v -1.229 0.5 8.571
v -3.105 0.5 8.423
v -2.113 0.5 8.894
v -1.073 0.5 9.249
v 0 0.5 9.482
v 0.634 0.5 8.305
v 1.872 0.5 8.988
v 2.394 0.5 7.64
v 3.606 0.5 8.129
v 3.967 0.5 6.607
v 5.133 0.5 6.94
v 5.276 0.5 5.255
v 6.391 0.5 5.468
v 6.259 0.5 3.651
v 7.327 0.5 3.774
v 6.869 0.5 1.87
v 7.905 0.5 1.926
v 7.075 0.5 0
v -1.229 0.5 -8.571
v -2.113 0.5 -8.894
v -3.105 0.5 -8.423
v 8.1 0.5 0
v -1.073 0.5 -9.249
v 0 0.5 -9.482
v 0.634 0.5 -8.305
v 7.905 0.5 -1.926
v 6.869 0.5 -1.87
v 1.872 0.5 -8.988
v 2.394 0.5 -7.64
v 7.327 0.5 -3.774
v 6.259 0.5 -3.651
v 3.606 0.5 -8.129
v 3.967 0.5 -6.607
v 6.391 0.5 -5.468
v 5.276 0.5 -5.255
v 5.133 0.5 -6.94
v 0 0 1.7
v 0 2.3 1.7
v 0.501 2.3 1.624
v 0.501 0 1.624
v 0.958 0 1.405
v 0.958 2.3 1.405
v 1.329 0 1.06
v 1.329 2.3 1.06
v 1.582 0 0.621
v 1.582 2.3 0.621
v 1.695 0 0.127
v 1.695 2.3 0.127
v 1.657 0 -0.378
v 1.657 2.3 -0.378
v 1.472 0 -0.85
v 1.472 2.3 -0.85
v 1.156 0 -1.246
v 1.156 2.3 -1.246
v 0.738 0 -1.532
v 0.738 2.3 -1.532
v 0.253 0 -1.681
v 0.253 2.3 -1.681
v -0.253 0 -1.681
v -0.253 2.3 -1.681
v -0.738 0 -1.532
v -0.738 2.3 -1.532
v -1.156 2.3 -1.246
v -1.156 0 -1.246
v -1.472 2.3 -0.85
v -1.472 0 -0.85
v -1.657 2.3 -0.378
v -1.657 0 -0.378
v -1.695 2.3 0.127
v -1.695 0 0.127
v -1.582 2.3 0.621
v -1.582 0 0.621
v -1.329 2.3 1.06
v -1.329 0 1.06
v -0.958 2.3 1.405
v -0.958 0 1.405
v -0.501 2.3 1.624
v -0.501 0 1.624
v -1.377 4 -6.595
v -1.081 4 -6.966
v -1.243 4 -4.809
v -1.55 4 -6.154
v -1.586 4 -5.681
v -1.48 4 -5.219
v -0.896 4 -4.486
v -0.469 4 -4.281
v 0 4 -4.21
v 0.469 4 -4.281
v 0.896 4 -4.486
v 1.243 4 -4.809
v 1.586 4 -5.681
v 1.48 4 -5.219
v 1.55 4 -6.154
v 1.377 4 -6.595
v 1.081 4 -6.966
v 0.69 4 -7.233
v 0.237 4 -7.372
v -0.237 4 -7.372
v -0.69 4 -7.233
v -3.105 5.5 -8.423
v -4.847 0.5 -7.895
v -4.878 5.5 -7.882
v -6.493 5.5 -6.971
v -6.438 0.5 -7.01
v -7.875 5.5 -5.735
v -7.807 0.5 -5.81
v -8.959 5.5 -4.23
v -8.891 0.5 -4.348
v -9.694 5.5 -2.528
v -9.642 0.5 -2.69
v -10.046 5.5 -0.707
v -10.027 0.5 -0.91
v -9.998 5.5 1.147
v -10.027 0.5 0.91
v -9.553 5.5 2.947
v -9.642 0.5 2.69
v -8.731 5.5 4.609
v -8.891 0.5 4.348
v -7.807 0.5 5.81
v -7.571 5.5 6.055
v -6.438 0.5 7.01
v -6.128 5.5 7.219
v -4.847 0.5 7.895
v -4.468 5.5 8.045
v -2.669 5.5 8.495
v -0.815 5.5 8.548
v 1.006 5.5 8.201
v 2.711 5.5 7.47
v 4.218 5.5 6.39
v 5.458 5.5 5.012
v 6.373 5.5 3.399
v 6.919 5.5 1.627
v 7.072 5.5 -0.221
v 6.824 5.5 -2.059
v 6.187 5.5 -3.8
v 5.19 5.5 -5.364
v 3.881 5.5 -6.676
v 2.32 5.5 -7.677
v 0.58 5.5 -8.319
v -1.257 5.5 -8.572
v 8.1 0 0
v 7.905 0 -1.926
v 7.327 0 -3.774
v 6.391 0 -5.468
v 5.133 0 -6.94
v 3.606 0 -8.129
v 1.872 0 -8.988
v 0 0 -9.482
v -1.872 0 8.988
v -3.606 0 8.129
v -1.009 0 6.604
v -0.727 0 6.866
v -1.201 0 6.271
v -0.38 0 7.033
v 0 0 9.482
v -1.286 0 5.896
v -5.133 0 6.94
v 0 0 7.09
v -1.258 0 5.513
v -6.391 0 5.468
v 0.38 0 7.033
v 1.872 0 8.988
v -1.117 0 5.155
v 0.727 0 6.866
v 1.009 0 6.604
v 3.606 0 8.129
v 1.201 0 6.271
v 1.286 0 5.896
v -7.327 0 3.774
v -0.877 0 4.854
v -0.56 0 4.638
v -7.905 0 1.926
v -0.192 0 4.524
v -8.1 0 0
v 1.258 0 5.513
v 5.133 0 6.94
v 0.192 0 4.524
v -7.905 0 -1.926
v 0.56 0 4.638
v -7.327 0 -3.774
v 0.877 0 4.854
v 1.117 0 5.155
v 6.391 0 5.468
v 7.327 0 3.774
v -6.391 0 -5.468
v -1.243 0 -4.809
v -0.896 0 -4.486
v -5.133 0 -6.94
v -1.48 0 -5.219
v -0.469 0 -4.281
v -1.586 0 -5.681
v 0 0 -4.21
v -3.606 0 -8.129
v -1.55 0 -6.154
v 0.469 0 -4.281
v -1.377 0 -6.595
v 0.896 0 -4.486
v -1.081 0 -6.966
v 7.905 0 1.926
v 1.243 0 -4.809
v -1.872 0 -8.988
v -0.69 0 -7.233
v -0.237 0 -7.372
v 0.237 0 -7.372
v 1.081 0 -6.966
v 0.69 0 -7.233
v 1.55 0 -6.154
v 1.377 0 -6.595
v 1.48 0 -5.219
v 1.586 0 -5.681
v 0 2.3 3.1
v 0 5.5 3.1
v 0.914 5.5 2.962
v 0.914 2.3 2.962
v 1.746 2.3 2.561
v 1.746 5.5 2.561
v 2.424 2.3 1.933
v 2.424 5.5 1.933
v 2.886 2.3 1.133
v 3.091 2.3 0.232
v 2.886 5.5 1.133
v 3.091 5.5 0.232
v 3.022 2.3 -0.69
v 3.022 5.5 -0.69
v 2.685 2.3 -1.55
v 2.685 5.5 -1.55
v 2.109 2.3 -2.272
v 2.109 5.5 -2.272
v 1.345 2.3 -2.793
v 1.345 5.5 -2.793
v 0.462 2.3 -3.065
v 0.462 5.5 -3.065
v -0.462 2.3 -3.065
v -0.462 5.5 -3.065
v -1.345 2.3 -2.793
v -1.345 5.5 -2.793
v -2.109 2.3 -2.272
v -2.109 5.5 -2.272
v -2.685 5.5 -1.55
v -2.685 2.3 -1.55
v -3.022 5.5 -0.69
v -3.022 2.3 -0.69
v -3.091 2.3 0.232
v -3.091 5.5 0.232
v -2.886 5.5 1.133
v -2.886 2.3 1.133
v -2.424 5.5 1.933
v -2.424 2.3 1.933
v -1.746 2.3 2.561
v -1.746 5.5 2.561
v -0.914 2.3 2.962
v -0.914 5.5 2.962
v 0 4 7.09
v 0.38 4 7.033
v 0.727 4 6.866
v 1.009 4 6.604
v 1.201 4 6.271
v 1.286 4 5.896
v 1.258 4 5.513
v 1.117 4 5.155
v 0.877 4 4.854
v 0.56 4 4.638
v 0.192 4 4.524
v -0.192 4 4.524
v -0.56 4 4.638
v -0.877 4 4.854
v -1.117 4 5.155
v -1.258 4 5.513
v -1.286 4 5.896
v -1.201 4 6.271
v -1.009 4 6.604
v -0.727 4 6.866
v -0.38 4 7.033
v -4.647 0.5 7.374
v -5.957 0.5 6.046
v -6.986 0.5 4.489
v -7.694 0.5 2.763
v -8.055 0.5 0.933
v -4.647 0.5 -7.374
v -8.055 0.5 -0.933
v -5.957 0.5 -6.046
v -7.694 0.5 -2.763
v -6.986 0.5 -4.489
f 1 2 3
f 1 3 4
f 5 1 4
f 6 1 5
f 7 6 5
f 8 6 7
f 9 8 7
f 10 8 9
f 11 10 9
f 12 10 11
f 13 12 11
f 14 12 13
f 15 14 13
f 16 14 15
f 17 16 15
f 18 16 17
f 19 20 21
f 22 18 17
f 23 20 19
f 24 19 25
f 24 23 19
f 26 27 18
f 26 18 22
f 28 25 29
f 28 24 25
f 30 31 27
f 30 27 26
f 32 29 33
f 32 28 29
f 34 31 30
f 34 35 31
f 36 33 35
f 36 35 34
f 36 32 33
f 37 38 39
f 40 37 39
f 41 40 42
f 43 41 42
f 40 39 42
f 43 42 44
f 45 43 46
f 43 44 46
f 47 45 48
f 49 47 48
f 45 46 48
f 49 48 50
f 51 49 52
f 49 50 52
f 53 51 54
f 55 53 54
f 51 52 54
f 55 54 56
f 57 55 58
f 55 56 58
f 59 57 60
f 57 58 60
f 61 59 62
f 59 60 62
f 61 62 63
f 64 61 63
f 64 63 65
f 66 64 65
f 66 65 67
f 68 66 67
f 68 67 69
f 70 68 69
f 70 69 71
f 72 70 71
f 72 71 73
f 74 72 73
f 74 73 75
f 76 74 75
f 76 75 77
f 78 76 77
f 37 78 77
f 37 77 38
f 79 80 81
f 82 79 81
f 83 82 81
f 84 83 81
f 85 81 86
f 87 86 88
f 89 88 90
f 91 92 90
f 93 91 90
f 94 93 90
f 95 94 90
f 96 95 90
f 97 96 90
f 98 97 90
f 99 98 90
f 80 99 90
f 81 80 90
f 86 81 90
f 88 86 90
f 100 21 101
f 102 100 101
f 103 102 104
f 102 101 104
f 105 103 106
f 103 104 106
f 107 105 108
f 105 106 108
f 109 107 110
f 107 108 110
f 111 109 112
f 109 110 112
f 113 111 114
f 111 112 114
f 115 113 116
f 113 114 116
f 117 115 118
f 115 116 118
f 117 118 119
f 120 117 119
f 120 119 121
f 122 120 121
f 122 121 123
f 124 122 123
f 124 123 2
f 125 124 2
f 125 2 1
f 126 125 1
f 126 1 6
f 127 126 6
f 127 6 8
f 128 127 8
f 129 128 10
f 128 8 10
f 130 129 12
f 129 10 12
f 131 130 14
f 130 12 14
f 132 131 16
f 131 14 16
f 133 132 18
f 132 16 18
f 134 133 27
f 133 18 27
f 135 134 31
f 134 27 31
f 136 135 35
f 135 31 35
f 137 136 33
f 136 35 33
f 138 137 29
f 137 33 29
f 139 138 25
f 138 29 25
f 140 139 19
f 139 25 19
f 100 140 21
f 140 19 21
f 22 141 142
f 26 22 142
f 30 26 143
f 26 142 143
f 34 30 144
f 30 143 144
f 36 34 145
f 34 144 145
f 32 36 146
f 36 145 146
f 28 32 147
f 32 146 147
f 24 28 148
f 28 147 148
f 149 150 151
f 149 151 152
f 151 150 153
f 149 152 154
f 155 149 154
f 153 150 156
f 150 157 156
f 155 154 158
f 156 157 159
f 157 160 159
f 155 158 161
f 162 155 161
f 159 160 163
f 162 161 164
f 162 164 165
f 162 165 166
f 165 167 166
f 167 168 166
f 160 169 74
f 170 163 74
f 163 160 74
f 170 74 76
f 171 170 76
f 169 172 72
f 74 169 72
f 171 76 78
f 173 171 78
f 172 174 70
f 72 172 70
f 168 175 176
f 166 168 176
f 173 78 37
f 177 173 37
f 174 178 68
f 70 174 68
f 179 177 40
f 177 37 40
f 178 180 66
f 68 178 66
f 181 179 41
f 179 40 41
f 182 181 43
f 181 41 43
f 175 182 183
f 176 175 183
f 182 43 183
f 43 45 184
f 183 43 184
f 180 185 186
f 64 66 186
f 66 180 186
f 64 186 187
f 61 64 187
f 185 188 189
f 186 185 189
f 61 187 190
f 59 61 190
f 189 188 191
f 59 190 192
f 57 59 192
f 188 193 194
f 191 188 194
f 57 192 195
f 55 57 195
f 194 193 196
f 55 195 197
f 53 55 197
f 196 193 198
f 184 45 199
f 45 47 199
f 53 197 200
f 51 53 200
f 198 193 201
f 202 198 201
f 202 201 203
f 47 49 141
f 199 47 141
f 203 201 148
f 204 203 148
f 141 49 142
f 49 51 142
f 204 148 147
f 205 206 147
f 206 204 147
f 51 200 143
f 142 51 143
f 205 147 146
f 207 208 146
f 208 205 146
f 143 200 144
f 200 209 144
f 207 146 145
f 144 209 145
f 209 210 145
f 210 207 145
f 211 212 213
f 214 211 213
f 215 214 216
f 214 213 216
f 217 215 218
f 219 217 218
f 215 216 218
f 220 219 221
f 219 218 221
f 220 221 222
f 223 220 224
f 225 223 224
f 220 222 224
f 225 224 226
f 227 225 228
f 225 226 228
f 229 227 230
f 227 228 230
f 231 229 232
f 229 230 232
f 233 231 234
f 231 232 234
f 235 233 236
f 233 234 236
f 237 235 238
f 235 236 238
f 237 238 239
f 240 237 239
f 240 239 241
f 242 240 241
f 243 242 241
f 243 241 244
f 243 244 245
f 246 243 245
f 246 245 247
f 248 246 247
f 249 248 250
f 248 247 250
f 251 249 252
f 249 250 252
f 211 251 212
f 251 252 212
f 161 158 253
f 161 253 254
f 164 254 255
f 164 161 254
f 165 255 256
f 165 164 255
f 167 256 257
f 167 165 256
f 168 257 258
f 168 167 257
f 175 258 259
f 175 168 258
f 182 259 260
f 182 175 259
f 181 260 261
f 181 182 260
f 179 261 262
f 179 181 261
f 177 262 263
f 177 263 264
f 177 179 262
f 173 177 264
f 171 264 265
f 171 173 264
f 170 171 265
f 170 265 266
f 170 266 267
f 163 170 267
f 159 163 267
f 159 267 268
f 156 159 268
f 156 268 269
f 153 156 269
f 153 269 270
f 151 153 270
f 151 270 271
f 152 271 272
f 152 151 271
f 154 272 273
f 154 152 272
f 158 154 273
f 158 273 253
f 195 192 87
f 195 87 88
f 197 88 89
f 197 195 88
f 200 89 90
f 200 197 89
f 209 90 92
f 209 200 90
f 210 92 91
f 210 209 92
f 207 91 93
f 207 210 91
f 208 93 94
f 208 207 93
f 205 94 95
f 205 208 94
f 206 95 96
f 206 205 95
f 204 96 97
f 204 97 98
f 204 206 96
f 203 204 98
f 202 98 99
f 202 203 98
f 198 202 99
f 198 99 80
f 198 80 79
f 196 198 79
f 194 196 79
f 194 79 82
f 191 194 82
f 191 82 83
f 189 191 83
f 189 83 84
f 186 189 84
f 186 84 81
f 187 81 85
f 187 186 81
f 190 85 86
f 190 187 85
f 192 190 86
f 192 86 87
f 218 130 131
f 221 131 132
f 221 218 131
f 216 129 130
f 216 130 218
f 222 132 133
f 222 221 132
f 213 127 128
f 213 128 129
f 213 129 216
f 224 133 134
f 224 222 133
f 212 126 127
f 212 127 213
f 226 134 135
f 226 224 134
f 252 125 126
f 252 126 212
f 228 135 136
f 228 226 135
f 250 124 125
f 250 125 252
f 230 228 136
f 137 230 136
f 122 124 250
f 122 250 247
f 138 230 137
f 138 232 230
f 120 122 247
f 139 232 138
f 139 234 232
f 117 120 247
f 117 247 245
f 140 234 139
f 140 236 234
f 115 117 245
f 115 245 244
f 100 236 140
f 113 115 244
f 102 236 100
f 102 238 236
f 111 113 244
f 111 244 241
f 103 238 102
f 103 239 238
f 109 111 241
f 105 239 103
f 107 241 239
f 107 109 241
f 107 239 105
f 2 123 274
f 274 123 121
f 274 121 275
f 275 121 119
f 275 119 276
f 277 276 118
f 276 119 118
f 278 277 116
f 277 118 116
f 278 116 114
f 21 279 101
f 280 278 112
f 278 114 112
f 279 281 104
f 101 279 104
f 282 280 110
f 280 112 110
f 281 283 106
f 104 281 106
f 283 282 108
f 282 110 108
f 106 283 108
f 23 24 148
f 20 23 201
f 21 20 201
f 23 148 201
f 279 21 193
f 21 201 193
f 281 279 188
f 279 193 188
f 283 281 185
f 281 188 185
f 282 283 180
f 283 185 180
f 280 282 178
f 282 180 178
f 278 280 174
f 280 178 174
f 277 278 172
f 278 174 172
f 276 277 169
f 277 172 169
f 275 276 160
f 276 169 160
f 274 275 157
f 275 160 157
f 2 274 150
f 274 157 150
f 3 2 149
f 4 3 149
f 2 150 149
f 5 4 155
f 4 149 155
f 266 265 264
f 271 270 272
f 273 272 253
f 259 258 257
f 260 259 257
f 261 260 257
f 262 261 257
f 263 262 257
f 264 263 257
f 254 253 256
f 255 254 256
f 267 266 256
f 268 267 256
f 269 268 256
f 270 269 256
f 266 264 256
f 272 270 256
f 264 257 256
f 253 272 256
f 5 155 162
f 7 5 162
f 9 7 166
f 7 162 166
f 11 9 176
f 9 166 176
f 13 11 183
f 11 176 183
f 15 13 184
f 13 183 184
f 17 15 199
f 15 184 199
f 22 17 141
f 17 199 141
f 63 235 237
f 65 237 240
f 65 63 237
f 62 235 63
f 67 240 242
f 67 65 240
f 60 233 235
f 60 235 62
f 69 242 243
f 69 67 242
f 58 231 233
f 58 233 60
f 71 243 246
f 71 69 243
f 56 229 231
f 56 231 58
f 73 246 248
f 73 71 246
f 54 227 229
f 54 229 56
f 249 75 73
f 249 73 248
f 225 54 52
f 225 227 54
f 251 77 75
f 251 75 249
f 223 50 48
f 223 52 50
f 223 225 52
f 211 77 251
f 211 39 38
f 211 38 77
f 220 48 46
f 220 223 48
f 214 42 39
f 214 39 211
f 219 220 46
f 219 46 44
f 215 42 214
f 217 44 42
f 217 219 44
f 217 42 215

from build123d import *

# Parameters (mm, degrees)
BOSS_EXTRUDE1_DEPTH = 0.5
SKETCH2_R           = 8.575
BOSS_EXTRUDE2_DEPTH = 5
SKETCH3_R           = 1.59
SKETCH3_R_2         = 1.29
CUT_EXTRUDE1_DEPTH  = 4
SKETCH4_R           = 1.7
CUT_EXTRUDE2_DEPTH  = 15.888439307
SKETCH5_R           = 3.1
CUT_EXTRUDE3_DEPTH  = 3.2


with BuildPart() as part:
    # Sketch1 → Boss-Extrude1 (new body)
    with BuildSketch(Plane(origin=(0, 0, 0), x_dir=(1, 0, 0), z_dir=(0, 1, 0))):
        with BuildLine():
            ThreePointArc((8.1, 0), (5.799315036, 6.235382907), (0, 9.482088378))
            ThreePointArc((0, 9.482088378), (-8.1, 0), (0, -9.482088378))
            ThreePointArc((0, -9.482088378), (5.799315036, -6.235382907), (8.1, 0))
        make_face()
    extrude(amount=BOSS_EXTRUDE1_DEPTH)

    # Sketch2 → Boss-Extrude2 (add)
    with BuildSketch(Plane(origin=(0, 0.5, 0), x_dir=(1, 0, 0), z_dir=(0, 1, 0))):
        with Locations(Location((-1.5, 0, 0), (0, 0, 100.787083295))):
            Circle(SKETCH2_R)
    extrude(amount=BOSS_EXTRUDE2_DEPTH)

    # Sketch3 → Cut-Extrude1 (cut)
    with BuildSketch(Plane(origin=(0, 0, 0), x_dir=(1, 0, 0), z_dir=(0, 1, 0))):
        with Locations(Location((0, 5.8, 0), (0, 0, 270))):
            Circle(SKETCH3_R)
        with Locations(Location((0, -5.8, 0), (0, 0, 270))):
            Circle(SKETCH3_R_2)
    extrude(amount=CUT_EXTRUDE1_DEPTH, mode=Mode.SUBTRACT)

    # Sketch4 → Cut-Extrude2 (cut, through all)
    with BuildSketch(Plane(origin=(0, 5.5, 0), x_dir=(1, 0, 0), z_dir=(0, 1, 0))):
        with Locations(Location((0, 0, 0), (0, 0, 270))):
            Circle(SKETCH4_R)
    extrude(amount=-CUT_EXTRUDE2_DEPTH, mode=Mode.SUBTRACT)

    # Sketch5 → Cut-Extrude3 (cut)
    with BuildSketch(Plane(origin=(0, 5.5, 0), x_dir=(1, 0, 0), z_dir=(0, 1, 0))):
        with Locations(Location((0, 0, 0), (0, 0, 270))):
            Circle(SKETCH5_R)
    extrude(amount=-CUT_EXTRUDE3_DEPTH, mode=Mode.SUBTRACT)


solid = part.part
